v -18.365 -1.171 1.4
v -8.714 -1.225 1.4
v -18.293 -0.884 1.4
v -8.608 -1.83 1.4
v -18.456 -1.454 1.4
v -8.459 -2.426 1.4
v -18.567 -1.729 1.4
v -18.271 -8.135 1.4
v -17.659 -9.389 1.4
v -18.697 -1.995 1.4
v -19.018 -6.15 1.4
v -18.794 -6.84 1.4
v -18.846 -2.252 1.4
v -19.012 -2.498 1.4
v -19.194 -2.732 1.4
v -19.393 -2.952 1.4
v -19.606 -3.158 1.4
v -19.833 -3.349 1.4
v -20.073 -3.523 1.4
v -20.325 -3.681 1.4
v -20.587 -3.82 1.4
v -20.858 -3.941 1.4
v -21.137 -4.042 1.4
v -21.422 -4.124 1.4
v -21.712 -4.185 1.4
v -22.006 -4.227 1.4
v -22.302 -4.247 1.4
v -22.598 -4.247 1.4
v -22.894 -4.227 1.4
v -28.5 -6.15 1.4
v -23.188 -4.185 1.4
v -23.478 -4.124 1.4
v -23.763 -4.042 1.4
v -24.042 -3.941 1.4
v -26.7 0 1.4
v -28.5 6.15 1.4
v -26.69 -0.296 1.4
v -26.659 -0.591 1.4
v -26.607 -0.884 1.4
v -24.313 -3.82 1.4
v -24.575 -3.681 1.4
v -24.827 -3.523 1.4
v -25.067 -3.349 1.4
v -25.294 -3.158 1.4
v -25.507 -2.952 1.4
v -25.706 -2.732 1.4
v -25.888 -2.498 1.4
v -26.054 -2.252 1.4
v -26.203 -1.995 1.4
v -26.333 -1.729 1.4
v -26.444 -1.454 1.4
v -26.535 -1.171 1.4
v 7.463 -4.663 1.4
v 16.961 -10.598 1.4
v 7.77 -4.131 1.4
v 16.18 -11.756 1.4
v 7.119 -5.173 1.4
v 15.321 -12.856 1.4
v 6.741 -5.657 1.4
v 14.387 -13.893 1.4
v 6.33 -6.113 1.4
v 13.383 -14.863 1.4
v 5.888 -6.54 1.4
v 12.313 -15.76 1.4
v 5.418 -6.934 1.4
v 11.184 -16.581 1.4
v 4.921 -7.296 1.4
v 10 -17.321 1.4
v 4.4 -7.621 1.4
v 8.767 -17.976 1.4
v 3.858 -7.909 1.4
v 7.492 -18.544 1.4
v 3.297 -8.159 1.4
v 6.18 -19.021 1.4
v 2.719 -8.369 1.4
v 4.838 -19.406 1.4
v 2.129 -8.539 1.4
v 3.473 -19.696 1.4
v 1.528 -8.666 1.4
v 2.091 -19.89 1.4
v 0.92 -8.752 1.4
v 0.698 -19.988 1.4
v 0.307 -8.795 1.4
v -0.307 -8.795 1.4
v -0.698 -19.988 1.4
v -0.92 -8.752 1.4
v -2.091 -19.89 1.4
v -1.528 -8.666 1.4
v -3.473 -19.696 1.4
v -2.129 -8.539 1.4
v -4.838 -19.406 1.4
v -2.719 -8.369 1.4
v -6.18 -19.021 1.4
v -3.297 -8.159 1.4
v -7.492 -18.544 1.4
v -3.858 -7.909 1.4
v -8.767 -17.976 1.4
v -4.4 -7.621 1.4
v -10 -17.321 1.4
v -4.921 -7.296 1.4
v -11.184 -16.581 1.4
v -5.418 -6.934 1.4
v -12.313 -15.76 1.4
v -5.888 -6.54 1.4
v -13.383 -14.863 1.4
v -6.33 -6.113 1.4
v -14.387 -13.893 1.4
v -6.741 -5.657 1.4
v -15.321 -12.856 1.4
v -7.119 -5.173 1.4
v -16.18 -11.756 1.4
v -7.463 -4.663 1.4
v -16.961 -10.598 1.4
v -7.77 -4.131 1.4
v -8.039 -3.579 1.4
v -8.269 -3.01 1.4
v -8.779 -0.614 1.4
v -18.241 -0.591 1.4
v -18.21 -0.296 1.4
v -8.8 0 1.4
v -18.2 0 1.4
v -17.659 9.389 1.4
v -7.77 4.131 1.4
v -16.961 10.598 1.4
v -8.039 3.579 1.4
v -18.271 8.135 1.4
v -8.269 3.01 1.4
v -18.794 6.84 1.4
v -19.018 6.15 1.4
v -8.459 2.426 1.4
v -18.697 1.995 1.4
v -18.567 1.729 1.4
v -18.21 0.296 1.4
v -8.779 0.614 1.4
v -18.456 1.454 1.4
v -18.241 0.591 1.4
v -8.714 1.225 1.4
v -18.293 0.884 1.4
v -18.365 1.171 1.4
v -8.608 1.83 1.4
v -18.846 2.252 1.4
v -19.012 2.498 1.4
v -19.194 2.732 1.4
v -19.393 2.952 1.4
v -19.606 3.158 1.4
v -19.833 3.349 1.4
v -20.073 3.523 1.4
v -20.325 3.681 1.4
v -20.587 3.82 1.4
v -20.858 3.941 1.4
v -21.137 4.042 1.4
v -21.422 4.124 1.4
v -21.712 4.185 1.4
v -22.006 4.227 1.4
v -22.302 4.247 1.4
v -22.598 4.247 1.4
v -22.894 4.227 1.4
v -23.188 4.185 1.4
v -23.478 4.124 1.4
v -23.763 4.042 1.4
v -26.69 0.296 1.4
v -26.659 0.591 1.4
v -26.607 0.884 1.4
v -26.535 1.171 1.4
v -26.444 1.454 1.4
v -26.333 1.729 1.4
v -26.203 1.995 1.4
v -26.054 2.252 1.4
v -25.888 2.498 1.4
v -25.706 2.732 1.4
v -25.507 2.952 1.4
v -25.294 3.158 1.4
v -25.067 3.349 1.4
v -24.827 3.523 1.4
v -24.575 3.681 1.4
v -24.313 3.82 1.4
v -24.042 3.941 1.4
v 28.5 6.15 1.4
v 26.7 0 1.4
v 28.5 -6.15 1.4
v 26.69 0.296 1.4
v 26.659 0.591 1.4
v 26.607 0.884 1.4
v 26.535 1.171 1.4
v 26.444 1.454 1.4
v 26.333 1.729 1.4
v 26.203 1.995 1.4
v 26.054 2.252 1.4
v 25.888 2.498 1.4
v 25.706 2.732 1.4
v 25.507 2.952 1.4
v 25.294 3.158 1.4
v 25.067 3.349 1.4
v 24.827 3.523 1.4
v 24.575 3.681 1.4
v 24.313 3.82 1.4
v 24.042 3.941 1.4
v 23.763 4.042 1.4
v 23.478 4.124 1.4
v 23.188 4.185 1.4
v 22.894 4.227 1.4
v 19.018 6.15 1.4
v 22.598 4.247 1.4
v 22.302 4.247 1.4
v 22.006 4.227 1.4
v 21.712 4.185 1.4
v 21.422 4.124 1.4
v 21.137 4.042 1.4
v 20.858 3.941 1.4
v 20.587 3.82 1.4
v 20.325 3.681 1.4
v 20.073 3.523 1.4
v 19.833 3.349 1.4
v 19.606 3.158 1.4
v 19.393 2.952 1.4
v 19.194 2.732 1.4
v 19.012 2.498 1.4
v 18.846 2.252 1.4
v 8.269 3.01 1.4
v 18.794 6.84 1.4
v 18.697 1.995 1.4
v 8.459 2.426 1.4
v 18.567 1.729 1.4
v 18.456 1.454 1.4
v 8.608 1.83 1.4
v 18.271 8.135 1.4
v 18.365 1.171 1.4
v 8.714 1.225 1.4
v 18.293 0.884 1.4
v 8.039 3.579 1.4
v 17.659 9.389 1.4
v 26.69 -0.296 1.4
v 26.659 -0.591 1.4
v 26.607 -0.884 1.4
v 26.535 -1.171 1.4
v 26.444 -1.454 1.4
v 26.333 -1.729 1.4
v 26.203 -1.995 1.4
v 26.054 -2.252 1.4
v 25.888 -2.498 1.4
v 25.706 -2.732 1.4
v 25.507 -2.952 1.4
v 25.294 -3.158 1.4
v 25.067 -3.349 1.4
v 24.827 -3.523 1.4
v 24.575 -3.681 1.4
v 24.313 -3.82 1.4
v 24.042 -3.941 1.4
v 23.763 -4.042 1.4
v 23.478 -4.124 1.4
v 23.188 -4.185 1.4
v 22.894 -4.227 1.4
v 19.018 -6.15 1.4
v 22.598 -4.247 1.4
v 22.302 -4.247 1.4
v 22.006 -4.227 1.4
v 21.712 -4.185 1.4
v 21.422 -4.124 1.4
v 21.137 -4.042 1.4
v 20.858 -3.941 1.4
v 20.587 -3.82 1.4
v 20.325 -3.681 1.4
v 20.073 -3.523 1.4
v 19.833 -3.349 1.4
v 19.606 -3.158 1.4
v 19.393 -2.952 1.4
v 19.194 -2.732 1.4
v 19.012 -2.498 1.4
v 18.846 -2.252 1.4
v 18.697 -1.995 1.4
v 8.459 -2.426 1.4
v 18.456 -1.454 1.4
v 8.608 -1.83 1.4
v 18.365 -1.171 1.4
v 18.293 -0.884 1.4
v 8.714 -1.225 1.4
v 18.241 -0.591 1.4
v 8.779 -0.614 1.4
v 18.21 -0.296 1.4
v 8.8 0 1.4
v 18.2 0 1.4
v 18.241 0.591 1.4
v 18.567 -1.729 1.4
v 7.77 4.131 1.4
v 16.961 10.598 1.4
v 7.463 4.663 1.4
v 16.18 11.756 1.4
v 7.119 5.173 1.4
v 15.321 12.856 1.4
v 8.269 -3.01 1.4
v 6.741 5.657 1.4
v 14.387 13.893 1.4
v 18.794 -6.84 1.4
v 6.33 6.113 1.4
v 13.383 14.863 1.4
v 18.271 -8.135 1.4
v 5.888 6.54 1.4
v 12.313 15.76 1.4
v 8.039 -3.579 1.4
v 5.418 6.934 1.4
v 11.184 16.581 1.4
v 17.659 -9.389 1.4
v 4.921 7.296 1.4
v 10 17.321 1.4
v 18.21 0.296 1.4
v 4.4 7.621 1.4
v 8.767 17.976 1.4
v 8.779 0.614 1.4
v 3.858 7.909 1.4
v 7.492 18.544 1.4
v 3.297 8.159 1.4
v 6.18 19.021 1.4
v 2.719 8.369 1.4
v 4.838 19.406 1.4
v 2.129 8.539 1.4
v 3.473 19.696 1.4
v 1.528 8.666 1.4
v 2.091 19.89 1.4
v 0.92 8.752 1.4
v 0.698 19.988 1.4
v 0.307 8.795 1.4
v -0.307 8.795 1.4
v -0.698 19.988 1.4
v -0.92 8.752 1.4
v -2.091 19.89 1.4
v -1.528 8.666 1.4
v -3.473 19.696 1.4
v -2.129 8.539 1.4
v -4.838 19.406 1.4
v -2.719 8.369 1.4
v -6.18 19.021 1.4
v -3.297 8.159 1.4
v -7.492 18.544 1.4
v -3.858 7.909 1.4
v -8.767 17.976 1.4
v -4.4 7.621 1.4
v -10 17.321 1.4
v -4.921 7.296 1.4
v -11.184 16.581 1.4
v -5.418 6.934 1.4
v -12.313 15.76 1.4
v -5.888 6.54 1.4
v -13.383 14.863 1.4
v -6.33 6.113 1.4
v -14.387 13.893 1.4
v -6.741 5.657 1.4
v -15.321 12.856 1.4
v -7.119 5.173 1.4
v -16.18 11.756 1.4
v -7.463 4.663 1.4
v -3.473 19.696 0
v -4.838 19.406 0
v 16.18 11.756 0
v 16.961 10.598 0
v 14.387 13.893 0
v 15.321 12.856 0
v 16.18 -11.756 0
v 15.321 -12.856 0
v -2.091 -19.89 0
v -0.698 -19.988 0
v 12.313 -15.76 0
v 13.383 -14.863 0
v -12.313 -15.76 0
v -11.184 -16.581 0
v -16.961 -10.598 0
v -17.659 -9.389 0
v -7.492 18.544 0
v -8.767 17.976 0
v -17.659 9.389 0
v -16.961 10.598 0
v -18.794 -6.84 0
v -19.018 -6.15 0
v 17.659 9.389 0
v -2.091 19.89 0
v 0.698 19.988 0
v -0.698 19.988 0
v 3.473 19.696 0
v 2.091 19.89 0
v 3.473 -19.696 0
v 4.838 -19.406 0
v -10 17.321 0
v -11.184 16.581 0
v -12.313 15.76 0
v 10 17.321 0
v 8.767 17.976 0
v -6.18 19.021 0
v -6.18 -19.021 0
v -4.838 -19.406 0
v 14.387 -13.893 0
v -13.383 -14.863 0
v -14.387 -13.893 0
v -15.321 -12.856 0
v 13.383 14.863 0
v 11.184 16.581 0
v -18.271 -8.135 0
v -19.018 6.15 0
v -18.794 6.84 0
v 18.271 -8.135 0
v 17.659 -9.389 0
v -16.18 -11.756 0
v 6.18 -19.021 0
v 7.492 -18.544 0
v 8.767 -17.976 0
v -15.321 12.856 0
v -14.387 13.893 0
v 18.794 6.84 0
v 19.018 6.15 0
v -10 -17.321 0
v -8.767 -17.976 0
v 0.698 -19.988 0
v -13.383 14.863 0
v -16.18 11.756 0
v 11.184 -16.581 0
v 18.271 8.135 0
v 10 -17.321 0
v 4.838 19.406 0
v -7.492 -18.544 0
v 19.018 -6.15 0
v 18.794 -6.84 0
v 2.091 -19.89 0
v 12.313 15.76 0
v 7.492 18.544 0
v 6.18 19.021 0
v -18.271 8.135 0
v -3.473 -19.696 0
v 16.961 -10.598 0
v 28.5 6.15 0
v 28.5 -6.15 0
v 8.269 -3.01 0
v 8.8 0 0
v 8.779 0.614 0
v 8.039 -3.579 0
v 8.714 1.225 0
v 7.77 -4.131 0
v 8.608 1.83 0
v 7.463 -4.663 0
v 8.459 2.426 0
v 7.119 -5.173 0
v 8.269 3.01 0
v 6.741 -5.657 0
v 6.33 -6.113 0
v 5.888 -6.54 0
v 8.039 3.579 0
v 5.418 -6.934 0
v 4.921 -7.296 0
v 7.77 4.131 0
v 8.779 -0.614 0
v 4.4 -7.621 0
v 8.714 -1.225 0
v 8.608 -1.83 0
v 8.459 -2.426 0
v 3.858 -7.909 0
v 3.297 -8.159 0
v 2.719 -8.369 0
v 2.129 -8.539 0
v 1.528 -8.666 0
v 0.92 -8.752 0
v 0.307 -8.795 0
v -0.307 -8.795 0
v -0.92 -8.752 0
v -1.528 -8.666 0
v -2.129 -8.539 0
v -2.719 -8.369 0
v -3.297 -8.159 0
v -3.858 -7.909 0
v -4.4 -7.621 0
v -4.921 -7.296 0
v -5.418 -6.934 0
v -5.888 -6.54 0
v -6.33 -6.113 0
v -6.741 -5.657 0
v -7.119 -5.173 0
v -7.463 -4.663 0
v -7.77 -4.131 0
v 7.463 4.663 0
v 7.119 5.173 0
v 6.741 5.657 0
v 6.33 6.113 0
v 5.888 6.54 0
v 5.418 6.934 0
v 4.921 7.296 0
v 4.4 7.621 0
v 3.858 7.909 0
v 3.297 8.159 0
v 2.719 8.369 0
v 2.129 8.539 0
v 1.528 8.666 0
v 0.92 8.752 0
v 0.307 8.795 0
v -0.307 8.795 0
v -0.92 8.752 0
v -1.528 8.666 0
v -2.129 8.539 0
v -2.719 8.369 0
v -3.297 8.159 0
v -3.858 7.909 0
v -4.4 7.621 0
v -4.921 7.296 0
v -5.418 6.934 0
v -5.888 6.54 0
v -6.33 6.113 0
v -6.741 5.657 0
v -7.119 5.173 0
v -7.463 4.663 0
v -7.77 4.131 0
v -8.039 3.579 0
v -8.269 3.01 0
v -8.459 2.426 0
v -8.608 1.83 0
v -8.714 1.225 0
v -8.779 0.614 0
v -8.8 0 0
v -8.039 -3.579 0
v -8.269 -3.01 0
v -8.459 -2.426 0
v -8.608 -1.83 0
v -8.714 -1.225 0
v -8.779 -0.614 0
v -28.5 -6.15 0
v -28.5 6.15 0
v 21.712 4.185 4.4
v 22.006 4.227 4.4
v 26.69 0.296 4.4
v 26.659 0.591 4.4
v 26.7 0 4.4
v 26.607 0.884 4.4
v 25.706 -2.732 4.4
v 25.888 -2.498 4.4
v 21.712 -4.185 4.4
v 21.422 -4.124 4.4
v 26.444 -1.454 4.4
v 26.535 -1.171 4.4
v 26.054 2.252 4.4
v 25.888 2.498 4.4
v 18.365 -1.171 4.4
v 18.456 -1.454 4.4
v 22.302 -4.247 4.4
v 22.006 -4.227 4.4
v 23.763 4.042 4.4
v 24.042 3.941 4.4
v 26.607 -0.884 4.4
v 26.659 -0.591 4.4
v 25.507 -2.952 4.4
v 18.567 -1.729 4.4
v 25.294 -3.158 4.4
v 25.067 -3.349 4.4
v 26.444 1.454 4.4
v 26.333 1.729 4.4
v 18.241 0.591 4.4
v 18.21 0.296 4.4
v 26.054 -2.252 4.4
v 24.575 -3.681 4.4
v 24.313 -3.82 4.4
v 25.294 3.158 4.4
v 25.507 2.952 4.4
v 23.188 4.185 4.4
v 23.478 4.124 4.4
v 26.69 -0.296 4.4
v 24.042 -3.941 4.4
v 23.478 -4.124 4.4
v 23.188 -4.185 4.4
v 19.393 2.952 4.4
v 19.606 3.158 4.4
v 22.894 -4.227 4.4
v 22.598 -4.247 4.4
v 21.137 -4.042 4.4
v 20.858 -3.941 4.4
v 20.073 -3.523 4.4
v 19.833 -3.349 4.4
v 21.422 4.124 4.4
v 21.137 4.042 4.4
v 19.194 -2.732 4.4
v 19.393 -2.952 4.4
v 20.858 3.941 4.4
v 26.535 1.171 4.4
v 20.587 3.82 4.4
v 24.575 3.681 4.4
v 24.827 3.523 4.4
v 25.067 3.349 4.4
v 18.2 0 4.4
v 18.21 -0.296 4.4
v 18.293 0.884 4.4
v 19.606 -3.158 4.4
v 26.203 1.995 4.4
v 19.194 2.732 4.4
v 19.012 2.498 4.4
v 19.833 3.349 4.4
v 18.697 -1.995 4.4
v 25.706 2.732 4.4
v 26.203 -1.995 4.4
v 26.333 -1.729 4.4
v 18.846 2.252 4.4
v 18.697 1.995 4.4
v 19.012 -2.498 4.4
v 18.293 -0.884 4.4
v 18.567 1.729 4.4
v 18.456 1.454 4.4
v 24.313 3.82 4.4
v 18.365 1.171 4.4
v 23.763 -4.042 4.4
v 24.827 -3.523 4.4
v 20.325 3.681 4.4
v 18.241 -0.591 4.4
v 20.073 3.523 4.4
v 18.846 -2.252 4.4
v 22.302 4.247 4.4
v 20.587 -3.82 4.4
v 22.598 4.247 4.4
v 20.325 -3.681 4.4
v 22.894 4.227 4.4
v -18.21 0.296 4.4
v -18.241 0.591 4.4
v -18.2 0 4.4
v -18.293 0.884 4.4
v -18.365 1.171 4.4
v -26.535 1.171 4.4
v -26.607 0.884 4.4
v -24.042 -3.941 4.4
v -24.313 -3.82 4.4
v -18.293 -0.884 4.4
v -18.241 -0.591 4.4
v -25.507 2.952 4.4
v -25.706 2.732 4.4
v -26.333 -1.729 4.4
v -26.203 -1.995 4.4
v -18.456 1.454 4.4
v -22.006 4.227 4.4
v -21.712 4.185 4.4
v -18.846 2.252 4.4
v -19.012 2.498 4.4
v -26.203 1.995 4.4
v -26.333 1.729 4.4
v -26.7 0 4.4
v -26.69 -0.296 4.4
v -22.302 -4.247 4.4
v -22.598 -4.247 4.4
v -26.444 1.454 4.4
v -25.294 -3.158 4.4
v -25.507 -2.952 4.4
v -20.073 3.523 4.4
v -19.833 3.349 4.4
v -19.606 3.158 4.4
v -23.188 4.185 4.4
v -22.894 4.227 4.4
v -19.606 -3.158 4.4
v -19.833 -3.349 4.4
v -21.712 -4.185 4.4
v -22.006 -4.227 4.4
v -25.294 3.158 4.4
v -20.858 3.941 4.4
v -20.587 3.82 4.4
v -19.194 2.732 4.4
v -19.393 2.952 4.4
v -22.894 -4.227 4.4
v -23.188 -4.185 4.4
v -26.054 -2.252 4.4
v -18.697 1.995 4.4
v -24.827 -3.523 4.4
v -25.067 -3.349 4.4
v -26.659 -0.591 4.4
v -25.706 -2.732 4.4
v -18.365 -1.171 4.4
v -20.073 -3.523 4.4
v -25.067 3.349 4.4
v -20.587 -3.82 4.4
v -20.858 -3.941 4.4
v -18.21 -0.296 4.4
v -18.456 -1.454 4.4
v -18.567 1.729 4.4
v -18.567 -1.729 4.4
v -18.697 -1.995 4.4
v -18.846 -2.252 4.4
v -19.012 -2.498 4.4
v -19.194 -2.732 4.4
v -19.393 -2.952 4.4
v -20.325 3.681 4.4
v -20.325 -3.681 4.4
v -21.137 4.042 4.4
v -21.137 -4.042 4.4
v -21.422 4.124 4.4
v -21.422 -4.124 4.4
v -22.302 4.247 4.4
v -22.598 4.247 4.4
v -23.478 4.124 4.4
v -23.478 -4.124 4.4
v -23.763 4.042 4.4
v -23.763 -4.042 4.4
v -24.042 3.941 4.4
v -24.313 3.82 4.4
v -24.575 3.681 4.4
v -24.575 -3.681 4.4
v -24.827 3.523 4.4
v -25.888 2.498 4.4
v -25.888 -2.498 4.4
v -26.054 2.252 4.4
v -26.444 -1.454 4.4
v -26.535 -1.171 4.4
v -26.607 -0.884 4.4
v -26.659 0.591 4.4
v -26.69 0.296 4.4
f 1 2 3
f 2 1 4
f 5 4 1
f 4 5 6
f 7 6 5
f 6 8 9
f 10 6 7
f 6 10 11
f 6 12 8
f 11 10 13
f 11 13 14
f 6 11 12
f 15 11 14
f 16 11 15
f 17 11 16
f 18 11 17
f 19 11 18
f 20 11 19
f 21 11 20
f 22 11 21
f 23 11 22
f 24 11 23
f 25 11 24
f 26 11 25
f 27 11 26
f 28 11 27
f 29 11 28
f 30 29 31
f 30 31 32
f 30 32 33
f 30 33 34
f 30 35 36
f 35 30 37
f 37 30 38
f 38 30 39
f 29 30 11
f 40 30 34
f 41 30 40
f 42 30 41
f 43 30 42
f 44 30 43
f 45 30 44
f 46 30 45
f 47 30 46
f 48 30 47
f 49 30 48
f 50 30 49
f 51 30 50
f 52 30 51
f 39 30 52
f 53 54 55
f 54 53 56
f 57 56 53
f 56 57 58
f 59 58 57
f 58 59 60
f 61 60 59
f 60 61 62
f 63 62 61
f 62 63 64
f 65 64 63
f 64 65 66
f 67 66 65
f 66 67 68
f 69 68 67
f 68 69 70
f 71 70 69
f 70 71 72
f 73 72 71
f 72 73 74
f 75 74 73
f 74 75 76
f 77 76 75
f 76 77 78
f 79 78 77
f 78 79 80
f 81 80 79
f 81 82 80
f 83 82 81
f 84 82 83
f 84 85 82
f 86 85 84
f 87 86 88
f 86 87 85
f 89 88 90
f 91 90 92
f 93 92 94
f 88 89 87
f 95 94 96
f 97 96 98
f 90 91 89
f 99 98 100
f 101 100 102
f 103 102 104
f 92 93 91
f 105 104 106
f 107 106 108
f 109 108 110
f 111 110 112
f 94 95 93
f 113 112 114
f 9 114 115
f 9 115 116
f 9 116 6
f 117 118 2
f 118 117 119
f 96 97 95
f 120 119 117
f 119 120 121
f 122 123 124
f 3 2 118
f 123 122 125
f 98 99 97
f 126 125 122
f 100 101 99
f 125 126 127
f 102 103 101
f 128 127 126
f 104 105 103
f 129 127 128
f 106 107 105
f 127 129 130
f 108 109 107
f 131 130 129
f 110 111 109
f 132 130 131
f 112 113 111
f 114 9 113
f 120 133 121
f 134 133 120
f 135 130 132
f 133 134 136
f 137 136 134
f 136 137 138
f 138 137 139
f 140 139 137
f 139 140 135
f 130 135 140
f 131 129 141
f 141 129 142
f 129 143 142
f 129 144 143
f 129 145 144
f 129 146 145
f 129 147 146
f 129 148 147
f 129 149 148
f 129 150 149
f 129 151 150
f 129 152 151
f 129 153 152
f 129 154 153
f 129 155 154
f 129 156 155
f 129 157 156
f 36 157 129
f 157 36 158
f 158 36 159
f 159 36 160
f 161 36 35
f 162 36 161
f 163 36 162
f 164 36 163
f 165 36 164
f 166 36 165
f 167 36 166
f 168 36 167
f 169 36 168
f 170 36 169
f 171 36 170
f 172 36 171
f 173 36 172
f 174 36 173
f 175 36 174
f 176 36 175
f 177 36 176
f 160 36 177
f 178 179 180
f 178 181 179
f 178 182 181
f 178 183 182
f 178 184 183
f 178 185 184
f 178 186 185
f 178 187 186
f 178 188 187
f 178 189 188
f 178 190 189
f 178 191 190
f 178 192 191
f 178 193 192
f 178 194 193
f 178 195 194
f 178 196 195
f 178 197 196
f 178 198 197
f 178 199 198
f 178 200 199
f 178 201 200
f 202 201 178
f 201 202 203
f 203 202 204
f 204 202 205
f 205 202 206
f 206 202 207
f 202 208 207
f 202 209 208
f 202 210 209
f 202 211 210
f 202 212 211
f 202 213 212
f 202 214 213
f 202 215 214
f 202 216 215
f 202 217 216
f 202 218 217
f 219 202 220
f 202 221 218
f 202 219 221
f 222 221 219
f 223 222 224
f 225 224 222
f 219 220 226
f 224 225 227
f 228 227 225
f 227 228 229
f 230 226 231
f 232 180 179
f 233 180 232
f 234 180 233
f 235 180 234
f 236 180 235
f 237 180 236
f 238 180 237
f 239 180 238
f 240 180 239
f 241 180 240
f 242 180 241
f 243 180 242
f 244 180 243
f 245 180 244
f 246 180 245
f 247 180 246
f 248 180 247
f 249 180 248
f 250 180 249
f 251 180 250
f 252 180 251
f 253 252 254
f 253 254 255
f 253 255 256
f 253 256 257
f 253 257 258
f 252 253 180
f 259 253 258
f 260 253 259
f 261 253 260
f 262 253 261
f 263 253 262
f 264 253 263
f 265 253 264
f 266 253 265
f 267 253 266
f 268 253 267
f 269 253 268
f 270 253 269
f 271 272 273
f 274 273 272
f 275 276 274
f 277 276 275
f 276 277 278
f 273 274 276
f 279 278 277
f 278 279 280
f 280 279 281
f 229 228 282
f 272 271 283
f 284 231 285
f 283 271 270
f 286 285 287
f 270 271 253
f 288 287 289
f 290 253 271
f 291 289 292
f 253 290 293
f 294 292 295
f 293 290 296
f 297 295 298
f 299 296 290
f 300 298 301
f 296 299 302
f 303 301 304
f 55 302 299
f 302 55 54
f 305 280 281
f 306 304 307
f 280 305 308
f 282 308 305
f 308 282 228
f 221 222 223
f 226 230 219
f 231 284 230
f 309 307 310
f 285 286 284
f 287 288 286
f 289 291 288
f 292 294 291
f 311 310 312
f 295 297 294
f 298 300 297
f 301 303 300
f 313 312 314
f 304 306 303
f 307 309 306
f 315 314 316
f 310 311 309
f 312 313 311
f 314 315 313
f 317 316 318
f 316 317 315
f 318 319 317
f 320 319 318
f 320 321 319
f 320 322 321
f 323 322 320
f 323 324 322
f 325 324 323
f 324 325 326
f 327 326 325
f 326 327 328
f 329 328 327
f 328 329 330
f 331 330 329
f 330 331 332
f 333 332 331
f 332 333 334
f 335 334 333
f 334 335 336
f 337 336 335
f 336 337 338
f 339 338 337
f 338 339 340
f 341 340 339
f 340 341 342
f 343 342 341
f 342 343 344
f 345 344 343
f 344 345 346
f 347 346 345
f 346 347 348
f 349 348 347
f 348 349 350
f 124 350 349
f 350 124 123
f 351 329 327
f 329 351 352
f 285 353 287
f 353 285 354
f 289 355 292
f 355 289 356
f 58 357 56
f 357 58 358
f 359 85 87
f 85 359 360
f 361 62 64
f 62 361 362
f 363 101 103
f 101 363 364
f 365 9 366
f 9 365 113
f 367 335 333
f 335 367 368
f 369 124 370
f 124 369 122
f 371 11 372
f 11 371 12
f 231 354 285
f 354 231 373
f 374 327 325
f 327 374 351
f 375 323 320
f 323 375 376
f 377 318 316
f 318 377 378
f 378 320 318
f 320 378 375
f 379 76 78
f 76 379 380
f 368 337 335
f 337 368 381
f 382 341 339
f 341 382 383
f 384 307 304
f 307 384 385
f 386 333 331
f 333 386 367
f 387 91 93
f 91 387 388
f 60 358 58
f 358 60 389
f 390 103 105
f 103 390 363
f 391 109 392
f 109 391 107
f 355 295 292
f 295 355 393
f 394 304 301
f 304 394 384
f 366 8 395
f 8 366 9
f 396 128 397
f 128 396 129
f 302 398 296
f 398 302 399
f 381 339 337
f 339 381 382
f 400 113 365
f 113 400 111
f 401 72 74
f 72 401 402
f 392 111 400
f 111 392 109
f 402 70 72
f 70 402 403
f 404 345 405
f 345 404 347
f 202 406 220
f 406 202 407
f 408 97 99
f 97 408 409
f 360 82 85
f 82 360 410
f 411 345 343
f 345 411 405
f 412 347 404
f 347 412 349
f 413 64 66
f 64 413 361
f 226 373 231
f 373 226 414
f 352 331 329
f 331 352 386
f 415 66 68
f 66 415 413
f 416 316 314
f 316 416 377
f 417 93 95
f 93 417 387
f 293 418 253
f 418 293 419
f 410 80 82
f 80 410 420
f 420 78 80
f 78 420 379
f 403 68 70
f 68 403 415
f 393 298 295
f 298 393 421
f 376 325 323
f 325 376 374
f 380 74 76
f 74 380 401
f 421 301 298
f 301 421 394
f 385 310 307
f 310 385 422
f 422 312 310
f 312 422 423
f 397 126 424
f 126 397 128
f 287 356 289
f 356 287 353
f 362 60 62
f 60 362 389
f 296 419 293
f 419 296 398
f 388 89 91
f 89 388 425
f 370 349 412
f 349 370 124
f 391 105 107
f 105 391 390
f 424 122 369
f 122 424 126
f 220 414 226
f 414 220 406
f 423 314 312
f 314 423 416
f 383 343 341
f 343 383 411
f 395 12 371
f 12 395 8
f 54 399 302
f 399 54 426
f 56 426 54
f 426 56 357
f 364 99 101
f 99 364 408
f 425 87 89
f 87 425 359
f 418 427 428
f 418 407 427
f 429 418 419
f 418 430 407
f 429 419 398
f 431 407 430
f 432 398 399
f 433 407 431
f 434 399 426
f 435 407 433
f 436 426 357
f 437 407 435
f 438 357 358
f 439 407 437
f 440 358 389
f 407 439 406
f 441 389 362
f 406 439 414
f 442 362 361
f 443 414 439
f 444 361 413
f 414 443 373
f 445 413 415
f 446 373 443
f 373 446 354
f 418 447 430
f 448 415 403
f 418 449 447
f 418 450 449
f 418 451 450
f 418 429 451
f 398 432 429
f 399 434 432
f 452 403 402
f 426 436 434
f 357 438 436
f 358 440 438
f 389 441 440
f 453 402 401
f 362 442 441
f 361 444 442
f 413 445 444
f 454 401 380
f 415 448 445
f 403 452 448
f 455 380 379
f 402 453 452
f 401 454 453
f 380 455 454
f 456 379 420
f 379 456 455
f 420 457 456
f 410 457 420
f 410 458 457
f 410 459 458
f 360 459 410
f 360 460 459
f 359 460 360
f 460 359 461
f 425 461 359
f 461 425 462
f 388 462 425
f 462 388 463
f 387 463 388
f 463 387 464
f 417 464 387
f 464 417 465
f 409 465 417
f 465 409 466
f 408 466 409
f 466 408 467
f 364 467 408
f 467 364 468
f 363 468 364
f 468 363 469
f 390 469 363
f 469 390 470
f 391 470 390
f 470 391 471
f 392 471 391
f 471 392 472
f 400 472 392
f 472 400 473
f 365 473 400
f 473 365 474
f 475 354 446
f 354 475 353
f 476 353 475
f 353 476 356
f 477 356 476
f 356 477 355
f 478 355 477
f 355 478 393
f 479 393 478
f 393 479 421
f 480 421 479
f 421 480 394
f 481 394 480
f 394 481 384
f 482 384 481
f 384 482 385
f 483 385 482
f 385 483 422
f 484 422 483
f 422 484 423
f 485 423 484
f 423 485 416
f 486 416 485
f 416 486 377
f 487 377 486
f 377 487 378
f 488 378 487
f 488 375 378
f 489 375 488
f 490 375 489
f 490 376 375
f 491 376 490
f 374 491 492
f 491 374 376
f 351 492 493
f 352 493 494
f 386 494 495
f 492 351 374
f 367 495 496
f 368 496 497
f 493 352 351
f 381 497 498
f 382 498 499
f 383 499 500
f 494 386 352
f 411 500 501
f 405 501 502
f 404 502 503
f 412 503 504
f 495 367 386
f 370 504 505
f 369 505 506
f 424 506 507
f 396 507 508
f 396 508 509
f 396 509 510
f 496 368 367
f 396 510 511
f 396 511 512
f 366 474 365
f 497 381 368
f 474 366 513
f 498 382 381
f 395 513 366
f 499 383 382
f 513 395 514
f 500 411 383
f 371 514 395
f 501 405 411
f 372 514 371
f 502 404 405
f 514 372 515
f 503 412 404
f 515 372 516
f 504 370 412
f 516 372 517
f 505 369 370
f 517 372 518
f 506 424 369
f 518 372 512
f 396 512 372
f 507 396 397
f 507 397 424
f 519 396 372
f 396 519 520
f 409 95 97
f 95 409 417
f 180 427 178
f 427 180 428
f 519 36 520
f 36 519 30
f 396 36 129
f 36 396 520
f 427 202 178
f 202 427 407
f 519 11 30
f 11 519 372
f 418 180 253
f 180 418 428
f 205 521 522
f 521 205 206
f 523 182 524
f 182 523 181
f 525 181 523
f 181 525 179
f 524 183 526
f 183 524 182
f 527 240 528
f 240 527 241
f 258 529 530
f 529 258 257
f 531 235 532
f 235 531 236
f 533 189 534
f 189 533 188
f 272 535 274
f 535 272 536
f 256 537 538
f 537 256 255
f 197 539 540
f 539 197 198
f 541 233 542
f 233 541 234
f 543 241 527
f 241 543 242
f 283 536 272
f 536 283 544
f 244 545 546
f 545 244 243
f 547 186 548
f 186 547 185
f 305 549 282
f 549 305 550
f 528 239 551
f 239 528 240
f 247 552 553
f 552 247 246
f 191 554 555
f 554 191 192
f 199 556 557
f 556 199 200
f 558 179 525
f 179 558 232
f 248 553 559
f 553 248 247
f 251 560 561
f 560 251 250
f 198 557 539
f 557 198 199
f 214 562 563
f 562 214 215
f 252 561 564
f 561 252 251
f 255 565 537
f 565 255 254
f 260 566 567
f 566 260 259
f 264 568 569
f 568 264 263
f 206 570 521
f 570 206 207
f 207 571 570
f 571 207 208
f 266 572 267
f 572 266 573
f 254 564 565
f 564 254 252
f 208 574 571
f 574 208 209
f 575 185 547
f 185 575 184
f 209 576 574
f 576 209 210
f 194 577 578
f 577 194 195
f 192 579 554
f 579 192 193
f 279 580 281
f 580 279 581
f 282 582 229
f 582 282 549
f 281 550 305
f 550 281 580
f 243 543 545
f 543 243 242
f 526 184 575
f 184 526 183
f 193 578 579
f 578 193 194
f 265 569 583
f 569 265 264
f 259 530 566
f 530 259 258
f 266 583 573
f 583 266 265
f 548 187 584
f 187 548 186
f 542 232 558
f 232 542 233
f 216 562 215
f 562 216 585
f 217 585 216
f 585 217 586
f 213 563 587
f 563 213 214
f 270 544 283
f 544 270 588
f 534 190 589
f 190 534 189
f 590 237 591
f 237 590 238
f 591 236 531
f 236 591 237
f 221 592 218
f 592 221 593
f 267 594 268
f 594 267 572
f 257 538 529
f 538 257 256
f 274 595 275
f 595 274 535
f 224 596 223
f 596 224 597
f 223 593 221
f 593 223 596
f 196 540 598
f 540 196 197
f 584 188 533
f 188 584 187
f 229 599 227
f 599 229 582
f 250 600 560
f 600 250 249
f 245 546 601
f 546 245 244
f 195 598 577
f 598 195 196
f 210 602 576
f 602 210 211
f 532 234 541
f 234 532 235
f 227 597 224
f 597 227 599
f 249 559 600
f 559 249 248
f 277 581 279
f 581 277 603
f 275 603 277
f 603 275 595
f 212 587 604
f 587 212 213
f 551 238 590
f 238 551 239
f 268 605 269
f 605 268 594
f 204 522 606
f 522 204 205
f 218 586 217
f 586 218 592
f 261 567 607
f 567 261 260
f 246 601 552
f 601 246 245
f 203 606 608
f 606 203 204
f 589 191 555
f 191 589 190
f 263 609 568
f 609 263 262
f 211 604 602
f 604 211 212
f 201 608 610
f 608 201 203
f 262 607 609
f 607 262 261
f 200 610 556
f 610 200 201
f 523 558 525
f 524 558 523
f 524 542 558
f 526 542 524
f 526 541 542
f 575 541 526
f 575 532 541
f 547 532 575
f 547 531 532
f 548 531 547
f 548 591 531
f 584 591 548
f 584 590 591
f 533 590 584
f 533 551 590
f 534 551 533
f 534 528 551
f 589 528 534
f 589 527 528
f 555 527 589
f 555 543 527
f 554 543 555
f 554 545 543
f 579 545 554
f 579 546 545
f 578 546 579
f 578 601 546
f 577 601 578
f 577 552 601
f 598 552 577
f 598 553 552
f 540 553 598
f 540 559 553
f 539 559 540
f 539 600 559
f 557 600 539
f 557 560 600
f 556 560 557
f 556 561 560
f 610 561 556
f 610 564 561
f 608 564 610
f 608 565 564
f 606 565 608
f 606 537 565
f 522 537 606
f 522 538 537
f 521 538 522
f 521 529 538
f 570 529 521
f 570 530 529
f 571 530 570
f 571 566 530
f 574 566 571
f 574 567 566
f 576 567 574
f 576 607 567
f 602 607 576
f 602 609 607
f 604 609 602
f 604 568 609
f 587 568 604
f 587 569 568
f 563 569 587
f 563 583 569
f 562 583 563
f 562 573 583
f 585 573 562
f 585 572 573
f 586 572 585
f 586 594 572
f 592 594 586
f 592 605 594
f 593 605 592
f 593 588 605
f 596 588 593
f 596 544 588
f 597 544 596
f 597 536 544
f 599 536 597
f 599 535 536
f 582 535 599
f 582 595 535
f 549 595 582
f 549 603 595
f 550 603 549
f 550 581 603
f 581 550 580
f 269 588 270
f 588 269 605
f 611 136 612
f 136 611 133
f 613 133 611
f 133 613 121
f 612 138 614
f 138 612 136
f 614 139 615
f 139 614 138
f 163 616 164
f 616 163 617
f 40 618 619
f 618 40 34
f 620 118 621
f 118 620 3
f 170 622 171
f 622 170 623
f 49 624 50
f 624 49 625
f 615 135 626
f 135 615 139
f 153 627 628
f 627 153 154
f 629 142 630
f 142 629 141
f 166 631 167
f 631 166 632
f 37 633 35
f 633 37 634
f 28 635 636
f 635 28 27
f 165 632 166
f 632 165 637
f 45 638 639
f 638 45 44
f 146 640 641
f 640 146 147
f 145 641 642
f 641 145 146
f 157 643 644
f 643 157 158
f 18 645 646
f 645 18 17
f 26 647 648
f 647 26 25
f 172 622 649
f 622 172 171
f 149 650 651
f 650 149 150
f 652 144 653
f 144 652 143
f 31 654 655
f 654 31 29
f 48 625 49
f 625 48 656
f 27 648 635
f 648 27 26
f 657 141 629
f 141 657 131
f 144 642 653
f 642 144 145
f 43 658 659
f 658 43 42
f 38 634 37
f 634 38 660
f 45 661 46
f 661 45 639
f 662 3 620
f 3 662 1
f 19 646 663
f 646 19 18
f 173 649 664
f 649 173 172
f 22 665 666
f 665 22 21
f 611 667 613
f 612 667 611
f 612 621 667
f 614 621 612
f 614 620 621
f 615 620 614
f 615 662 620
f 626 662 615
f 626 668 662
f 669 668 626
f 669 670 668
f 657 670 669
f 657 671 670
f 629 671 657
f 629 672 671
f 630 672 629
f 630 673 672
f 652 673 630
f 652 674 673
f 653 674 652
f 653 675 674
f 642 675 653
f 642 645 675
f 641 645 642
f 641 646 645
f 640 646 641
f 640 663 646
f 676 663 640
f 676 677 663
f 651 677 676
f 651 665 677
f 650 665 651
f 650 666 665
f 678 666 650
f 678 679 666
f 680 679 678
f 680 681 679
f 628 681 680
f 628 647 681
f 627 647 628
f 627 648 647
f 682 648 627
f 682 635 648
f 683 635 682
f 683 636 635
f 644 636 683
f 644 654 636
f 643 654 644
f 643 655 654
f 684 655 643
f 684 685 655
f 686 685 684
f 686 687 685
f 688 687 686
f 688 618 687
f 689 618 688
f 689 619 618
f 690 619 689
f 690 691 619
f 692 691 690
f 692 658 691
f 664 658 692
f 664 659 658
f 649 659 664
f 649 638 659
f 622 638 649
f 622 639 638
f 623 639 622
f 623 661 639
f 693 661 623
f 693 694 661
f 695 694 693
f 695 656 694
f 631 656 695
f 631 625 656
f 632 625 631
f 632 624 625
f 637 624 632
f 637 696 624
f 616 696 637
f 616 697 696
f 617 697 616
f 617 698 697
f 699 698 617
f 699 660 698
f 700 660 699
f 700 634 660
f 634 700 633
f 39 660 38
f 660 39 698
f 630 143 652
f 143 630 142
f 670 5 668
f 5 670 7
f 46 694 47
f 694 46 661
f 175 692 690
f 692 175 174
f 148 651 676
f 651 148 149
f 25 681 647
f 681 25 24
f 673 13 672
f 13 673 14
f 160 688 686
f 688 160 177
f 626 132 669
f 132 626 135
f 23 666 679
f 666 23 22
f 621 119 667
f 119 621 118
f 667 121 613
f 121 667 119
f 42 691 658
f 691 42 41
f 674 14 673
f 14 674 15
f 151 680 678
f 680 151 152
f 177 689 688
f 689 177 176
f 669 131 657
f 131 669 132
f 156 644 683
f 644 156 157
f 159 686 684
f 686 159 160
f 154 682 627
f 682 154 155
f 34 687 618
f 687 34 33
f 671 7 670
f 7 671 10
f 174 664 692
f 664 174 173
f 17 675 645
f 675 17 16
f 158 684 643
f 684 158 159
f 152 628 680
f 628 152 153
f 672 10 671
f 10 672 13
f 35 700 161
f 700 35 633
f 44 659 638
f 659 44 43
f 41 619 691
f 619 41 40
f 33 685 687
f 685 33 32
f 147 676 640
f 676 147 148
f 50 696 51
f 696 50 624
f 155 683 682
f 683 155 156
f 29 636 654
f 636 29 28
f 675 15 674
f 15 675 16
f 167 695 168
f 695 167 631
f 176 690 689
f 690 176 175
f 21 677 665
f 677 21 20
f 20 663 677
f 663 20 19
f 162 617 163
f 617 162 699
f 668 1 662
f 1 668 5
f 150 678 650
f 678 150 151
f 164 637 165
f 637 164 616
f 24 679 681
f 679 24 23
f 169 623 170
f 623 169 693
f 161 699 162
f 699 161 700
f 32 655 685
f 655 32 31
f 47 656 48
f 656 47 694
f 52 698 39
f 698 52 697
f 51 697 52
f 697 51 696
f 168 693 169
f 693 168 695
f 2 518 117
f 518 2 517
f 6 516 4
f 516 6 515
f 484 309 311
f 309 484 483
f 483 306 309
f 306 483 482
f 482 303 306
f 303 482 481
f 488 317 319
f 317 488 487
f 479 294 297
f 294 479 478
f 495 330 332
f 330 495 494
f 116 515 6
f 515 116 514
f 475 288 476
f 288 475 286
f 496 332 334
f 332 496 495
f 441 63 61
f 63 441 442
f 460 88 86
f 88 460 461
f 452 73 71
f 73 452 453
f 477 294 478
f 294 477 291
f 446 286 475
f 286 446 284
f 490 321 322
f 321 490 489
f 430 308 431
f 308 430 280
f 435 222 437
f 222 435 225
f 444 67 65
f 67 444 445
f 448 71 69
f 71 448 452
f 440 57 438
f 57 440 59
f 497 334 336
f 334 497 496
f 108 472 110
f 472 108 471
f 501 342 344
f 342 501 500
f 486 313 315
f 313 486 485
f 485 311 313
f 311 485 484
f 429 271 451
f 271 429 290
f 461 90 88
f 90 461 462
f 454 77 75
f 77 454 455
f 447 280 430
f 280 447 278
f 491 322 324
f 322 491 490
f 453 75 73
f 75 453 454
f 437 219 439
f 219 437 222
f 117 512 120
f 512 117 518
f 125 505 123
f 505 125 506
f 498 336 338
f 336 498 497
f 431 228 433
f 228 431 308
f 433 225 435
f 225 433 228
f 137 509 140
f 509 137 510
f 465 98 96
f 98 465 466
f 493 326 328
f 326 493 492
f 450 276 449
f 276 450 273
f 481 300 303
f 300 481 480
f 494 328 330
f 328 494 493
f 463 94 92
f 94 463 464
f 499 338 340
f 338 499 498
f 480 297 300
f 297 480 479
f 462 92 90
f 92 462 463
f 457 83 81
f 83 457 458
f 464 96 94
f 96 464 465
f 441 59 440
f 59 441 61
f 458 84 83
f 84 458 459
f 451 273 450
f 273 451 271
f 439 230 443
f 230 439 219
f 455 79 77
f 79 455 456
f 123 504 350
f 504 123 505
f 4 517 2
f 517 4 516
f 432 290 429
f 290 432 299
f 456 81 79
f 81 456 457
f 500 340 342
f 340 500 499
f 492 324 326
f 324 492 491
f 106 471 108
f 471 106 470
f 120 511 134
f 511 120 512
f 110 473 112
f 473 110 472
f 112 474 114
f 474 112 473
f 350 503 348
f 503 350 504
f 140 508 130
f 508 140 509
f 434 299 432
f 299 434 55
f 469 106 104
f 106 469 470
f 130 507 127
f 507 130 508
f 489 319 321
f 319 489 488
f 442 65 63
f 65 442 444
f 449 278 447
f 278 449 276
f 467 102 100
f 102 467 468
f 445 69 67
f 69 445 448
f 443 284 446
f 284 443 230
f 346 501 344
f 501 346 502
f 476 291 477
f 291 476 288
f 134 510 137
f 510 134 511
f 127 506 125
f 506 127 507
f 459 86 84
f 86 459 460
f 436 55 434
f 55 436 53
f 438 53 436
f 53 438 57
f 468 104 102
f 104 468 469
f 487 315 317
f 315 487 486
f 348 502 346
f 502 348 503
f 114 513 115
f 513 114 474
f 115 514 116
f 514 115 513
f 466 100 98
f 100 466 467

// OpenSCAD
$fn=90;
//Dicke untere Platte
t1=1.4;
//Dicke Lochebene (wenn wir die brauchen)
t2=2.5;
//Durchmesser Knubbel Messer
dk=8.5;
//Durchmesser Loch mitte Messer
dlm=18.2;
//Abstand Knubbel zu Knubbel außen Messer
akk=53.4;
//Dicke Messer
dm=3.0;
//Lochdurchmesser
ld=11.0;
//Ring innen Durchmesser
rid=17.6;
//Ringebene Durchmesser
red=40.0;
//Abstand Ohr zu Ohr außen
aoo=57.0;
//Zusatz für Ohrbreite zu dk (einfach mal t2, hört sich gut an, oder fester Wert geschätzt)
zob=3.8;
//Ohrbreite (nicht gemessen, blöd, aber mindestens dk)
ob=dk+zob;
//Versatz Knubbel
vk=akk/2-dk/2;

module part()
{
//Ebene
cylinder(h=t1, d=red);
//Ohren
translate([0,0,t1/2])
cube([57,ob,t1], center=true);
//Knubbel
module knubbel()
{
    color("blue")
cylinder(h=t1+dm, d=dk);
}
translate([vk,0,0])
knubbel();
translate([-vk,0,0])
knubbel();
}

difference()
{
    part();
    
//Ring
cylinder(h=t1+t2, d=rid);
}
